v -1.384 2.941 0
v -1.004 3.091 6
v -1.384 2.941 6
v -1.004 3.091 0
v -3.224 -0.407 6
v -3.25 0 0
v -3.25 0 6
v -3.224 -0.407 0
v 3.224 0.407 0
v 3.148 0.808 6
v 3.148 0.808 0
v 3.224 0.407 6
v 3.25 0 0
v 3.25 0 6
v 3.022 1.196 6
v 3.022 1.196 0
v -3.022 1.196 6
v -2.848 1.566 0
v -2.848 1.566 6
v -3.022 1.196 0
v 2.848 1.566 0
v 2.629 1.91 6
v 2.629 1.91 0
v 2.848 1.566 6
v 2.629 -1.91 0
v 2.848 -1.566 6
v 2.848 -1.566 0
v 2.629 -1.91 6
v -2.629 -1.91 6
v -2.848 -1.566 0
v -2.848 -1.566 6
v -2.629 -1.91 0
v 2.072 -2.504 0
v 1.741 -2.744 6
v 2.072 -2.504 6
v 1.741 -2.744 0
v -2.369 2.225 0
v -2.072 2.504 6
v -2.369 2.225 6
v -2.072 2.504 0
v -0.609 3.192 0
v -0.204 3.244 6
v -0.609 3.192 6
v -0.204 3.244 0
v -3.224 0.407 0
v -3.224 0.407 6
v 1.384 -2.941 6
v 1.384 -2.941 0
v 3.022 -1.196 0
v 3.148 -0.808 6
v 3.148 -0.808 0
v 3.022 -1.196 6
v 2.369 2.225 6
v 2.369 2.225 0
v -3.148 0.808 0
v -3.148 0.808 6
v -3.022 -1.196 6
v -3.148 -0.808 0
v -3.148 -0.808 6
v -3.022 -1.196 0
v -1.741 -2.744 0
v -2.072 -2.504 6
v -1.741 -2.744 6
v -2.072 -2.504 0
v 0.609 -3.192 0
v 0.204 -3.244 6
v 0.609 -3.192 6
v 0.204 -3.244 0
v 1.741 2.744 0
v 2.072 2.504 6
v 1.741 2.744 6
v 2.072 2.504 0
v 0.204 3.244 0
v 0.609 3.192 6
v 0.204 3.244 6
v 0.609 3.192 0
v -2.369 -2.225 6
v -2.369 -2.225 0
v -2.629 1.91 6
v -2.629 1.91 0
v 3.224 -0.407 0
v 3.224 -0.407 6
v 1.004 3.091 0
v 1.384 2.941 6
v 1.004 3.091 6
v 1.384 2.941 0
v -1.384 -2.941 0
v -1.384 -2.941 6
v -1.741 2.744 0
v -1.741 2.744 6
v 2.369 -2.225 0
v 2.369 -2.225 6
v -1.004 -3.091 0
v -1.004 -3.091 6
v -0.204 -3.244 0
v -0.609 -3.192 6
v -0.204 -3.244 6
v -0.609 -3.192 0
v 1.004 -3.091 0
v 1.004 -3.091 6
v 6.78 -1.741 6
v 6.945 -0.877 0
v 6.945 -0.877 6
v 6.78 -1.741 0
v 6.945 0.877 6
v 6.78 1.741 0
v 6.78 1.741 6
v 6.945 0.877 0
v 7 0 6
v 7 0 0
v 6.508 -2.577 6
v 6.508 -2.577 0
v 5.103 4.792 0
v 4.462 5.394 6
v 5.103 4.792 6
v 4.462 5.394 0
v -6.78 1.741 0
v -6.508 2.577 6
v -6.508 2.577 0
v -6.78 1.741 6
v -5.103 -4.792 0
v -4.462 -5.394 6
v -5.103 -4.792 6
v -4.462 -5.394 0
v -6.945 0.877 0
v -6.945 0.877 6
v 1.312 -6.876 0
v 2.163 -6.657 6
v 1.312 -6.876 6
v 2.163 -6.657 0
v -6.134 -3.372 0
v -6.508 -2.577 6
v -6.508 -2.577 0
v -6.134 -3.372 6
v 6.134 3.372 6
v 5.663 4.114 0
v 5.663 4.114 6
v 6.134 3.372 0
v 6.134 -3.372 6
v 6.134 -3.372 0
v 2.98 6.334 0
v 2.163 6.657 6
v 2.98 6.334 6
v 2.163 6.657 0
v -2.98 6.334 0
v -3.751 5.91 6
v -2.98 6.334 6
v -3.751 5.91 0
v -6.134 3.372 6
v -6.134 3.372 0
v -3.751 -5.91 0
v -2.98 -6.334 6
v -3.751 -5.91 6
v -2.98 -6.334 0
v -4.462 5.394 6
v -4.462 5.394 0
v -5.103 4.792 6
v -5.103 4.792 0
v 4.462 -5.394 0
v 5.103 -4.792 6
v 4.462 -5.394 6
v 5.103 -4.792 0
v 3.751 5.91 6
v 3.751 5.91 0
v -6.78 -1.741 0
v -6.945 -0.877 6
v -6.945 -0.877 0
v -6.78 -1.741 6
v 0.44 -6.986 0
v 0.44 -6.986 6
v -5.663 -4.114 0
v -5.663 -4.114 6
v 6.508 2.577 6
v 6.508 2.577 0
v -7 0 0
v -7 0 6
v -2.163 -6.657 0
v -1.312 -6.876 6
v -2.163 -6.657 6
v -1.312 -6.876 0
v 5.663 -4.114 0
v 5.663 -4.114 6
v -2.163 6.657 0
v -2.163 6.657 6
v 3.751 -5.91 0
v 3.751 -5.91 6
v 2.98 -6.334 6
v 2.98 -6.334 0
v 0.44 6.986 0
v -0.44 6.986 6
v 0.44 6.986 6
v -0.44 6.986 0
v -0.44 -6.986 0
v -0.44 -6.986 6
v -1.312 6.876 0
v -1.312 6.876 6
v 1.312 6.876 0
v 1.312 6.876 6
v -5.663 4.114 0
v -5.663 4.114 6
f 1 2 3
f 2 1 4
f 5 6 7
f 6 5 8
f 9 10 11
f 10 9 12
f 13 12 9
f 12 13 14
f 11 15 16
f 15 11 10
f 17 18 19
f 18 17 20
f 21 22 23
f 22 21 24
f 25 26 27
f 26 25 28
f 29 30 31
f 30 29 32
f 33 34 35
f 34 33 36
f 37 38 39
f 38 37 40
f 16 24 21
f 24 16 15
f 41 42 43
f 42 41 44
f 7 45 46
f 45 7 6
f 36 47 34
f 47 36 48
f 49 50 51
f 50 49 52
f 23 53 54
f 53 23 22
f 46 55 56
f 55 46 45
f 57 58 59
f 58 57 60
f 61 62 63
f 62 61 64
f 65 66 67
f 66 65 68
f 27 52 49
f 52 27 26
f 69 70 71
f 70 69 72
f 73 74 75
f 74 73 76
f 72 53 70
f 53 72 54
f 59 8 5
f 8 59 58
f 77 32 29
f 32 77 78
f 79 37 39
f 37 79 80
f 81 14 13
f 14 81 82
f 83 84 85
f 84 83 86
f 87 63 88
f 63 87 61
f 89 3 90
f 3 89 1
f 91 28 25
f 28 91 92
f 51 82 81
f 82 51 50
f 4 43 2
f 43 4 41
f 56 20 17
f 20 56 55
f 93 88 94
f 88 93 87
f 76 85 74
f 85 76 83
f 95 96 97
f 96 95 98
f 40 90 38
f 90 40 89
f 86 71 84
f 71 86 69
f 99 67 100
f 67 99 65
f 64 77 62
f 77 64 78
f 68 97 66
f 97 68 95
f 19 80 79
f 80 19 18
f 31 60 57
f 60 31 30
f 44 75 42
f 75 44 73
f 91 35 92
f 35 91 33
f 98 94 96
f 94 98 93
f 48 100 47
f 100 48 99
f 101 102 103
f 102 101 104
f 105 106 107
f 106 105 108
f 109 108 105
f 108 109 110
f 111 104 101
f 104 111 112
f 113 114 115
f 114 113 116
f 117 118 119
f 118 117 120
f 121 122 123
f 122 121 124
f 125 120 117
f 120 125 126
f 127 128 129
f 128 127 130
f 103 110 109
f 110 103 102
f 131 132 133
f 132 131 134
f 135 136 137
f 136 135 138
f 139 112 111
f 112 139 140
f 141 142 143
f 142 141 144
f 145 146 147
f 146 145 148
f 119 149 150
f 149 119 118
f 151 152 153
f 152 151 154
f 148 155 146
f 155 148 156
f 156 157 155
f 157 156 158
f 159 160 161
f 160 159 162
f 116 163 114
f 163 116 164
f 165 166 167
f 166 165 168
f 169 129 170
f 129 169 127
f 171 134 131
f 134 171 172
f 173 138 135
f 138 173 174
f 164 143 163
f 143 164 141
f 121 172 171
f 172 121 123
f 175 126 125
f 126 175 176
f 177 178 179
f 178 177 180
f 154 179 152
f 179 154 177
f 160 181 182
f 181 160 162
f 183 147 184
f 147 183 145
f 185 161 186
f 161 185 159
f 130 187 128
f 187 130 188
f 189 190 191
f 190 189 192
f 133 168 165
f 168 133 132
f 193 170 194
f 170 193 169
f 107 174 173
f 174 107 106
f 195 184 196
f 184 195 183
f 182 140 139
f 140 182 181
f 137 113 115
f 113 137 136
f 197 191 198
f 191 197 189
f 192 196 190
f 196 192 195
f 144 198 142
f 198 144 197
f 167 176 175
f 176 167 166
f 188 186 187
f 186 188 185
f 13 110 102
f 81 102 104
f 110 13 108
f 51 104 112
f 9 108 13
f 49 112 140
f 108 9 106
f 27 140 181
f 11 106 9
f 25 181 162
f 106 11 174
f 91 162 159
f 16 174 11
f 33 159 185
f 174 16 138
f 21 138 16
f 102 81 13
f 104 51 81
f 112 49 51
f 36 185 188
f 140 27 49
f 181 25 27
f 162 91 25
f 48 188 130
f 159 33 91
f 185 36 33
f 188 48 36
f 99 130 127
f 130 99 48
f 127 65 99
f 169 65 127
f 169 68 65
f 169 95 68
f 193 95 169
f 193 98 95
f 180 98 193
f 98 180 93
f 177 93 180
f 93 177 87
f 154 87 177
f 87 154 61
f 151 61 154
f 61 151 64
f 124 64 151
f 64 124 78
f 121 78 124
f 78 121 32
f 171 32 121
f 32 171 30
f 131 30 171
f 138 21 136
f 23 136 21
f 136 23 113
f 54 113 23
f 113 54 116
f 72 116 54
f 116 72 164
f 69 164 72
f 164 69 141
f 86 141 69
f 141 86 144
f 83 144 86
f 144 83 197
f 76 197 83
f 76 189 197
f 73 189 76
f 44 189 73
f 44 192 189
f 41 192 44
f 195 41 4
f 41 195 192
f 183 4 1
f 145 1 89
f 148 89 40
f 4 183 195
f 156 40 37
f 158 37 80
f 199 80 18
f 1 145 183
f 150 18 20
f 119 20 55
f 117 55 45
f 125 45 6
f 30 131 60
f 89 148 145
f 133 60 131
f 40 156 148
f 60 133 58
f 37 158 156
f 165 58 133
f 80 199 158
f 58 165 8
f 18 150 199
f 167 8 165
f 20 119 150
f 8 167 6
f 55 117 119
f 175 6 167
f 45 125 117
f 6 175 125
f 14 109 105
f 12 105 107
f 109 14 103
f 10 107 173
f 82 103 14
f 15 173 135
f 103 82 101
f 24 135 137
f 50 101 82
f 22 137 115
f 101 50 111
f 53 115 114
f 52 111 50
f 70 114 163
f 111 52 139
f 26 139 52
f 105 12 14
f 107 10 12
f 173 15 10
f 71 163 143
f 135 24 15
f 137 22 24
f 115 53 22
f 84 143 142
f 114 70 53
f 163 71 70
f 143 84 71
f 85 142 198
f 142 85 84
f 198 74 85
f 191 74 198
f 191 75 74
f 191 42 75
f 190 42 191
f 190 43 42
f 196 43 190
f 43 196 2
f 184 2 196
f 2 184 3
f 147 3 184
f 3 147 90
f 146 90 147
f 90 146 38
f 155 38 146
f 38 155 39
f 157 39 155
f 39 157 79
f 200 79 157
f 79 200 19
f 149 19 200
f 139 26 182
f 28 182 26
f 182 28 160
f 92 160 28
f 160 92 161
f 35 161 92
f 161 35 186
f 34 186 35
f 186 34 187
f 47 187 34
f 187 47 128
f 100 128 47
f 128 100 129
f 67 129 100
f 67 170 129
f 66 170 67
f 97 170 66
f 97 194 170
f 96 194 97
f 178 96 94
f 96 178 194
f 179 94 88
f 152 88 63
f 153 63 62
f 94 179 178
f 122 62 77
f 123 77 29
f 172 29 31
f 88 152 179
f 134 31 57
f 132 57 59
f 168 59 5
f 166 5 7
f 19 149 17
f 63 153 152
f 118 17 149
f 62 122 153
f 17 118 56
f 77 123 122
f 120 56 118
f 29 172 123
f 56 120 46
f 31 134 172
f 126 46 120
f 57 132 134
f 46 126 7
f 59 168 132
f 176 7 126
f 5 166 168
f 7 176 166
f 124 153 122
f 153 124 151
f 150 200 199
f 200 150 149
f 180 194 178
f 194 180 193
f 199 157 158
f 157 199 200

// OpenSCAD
$fn = 50;


difference() {
	union() {
		*color(alpha = 1.0000000000, c = "gray") {
			translate(v = [0, 7, 0]) {
				linear_extrude(height = 1) {
					text(font = "Arial:style=Bold", halign = "center", size = 4.5000000000, text = "COMMENT plate main", valign = "center");
				}
			}
		}
		cylinder(h = 6, r = 7.0000000000);
	}
	union() {
		*color(alpha = 1.0000000000, c = "gray") {
			translate(v = [0, 7, 0]) {
				linear_extrude(height = 1) {
					text(font = "Arial:style=Bold", halign = "center", size = 4.5000000000, text = "COMMENT holes main", valign = "center");
				}
			}
		}
		translate(v = [0, 0, -100]) {
			cylinder(h = 200, r = 3.2500000000);
		}
		translate(v = [0, 0, -100]) {
			cylinder(h = 200, r = 1.8000000000);
		}
	}
}
